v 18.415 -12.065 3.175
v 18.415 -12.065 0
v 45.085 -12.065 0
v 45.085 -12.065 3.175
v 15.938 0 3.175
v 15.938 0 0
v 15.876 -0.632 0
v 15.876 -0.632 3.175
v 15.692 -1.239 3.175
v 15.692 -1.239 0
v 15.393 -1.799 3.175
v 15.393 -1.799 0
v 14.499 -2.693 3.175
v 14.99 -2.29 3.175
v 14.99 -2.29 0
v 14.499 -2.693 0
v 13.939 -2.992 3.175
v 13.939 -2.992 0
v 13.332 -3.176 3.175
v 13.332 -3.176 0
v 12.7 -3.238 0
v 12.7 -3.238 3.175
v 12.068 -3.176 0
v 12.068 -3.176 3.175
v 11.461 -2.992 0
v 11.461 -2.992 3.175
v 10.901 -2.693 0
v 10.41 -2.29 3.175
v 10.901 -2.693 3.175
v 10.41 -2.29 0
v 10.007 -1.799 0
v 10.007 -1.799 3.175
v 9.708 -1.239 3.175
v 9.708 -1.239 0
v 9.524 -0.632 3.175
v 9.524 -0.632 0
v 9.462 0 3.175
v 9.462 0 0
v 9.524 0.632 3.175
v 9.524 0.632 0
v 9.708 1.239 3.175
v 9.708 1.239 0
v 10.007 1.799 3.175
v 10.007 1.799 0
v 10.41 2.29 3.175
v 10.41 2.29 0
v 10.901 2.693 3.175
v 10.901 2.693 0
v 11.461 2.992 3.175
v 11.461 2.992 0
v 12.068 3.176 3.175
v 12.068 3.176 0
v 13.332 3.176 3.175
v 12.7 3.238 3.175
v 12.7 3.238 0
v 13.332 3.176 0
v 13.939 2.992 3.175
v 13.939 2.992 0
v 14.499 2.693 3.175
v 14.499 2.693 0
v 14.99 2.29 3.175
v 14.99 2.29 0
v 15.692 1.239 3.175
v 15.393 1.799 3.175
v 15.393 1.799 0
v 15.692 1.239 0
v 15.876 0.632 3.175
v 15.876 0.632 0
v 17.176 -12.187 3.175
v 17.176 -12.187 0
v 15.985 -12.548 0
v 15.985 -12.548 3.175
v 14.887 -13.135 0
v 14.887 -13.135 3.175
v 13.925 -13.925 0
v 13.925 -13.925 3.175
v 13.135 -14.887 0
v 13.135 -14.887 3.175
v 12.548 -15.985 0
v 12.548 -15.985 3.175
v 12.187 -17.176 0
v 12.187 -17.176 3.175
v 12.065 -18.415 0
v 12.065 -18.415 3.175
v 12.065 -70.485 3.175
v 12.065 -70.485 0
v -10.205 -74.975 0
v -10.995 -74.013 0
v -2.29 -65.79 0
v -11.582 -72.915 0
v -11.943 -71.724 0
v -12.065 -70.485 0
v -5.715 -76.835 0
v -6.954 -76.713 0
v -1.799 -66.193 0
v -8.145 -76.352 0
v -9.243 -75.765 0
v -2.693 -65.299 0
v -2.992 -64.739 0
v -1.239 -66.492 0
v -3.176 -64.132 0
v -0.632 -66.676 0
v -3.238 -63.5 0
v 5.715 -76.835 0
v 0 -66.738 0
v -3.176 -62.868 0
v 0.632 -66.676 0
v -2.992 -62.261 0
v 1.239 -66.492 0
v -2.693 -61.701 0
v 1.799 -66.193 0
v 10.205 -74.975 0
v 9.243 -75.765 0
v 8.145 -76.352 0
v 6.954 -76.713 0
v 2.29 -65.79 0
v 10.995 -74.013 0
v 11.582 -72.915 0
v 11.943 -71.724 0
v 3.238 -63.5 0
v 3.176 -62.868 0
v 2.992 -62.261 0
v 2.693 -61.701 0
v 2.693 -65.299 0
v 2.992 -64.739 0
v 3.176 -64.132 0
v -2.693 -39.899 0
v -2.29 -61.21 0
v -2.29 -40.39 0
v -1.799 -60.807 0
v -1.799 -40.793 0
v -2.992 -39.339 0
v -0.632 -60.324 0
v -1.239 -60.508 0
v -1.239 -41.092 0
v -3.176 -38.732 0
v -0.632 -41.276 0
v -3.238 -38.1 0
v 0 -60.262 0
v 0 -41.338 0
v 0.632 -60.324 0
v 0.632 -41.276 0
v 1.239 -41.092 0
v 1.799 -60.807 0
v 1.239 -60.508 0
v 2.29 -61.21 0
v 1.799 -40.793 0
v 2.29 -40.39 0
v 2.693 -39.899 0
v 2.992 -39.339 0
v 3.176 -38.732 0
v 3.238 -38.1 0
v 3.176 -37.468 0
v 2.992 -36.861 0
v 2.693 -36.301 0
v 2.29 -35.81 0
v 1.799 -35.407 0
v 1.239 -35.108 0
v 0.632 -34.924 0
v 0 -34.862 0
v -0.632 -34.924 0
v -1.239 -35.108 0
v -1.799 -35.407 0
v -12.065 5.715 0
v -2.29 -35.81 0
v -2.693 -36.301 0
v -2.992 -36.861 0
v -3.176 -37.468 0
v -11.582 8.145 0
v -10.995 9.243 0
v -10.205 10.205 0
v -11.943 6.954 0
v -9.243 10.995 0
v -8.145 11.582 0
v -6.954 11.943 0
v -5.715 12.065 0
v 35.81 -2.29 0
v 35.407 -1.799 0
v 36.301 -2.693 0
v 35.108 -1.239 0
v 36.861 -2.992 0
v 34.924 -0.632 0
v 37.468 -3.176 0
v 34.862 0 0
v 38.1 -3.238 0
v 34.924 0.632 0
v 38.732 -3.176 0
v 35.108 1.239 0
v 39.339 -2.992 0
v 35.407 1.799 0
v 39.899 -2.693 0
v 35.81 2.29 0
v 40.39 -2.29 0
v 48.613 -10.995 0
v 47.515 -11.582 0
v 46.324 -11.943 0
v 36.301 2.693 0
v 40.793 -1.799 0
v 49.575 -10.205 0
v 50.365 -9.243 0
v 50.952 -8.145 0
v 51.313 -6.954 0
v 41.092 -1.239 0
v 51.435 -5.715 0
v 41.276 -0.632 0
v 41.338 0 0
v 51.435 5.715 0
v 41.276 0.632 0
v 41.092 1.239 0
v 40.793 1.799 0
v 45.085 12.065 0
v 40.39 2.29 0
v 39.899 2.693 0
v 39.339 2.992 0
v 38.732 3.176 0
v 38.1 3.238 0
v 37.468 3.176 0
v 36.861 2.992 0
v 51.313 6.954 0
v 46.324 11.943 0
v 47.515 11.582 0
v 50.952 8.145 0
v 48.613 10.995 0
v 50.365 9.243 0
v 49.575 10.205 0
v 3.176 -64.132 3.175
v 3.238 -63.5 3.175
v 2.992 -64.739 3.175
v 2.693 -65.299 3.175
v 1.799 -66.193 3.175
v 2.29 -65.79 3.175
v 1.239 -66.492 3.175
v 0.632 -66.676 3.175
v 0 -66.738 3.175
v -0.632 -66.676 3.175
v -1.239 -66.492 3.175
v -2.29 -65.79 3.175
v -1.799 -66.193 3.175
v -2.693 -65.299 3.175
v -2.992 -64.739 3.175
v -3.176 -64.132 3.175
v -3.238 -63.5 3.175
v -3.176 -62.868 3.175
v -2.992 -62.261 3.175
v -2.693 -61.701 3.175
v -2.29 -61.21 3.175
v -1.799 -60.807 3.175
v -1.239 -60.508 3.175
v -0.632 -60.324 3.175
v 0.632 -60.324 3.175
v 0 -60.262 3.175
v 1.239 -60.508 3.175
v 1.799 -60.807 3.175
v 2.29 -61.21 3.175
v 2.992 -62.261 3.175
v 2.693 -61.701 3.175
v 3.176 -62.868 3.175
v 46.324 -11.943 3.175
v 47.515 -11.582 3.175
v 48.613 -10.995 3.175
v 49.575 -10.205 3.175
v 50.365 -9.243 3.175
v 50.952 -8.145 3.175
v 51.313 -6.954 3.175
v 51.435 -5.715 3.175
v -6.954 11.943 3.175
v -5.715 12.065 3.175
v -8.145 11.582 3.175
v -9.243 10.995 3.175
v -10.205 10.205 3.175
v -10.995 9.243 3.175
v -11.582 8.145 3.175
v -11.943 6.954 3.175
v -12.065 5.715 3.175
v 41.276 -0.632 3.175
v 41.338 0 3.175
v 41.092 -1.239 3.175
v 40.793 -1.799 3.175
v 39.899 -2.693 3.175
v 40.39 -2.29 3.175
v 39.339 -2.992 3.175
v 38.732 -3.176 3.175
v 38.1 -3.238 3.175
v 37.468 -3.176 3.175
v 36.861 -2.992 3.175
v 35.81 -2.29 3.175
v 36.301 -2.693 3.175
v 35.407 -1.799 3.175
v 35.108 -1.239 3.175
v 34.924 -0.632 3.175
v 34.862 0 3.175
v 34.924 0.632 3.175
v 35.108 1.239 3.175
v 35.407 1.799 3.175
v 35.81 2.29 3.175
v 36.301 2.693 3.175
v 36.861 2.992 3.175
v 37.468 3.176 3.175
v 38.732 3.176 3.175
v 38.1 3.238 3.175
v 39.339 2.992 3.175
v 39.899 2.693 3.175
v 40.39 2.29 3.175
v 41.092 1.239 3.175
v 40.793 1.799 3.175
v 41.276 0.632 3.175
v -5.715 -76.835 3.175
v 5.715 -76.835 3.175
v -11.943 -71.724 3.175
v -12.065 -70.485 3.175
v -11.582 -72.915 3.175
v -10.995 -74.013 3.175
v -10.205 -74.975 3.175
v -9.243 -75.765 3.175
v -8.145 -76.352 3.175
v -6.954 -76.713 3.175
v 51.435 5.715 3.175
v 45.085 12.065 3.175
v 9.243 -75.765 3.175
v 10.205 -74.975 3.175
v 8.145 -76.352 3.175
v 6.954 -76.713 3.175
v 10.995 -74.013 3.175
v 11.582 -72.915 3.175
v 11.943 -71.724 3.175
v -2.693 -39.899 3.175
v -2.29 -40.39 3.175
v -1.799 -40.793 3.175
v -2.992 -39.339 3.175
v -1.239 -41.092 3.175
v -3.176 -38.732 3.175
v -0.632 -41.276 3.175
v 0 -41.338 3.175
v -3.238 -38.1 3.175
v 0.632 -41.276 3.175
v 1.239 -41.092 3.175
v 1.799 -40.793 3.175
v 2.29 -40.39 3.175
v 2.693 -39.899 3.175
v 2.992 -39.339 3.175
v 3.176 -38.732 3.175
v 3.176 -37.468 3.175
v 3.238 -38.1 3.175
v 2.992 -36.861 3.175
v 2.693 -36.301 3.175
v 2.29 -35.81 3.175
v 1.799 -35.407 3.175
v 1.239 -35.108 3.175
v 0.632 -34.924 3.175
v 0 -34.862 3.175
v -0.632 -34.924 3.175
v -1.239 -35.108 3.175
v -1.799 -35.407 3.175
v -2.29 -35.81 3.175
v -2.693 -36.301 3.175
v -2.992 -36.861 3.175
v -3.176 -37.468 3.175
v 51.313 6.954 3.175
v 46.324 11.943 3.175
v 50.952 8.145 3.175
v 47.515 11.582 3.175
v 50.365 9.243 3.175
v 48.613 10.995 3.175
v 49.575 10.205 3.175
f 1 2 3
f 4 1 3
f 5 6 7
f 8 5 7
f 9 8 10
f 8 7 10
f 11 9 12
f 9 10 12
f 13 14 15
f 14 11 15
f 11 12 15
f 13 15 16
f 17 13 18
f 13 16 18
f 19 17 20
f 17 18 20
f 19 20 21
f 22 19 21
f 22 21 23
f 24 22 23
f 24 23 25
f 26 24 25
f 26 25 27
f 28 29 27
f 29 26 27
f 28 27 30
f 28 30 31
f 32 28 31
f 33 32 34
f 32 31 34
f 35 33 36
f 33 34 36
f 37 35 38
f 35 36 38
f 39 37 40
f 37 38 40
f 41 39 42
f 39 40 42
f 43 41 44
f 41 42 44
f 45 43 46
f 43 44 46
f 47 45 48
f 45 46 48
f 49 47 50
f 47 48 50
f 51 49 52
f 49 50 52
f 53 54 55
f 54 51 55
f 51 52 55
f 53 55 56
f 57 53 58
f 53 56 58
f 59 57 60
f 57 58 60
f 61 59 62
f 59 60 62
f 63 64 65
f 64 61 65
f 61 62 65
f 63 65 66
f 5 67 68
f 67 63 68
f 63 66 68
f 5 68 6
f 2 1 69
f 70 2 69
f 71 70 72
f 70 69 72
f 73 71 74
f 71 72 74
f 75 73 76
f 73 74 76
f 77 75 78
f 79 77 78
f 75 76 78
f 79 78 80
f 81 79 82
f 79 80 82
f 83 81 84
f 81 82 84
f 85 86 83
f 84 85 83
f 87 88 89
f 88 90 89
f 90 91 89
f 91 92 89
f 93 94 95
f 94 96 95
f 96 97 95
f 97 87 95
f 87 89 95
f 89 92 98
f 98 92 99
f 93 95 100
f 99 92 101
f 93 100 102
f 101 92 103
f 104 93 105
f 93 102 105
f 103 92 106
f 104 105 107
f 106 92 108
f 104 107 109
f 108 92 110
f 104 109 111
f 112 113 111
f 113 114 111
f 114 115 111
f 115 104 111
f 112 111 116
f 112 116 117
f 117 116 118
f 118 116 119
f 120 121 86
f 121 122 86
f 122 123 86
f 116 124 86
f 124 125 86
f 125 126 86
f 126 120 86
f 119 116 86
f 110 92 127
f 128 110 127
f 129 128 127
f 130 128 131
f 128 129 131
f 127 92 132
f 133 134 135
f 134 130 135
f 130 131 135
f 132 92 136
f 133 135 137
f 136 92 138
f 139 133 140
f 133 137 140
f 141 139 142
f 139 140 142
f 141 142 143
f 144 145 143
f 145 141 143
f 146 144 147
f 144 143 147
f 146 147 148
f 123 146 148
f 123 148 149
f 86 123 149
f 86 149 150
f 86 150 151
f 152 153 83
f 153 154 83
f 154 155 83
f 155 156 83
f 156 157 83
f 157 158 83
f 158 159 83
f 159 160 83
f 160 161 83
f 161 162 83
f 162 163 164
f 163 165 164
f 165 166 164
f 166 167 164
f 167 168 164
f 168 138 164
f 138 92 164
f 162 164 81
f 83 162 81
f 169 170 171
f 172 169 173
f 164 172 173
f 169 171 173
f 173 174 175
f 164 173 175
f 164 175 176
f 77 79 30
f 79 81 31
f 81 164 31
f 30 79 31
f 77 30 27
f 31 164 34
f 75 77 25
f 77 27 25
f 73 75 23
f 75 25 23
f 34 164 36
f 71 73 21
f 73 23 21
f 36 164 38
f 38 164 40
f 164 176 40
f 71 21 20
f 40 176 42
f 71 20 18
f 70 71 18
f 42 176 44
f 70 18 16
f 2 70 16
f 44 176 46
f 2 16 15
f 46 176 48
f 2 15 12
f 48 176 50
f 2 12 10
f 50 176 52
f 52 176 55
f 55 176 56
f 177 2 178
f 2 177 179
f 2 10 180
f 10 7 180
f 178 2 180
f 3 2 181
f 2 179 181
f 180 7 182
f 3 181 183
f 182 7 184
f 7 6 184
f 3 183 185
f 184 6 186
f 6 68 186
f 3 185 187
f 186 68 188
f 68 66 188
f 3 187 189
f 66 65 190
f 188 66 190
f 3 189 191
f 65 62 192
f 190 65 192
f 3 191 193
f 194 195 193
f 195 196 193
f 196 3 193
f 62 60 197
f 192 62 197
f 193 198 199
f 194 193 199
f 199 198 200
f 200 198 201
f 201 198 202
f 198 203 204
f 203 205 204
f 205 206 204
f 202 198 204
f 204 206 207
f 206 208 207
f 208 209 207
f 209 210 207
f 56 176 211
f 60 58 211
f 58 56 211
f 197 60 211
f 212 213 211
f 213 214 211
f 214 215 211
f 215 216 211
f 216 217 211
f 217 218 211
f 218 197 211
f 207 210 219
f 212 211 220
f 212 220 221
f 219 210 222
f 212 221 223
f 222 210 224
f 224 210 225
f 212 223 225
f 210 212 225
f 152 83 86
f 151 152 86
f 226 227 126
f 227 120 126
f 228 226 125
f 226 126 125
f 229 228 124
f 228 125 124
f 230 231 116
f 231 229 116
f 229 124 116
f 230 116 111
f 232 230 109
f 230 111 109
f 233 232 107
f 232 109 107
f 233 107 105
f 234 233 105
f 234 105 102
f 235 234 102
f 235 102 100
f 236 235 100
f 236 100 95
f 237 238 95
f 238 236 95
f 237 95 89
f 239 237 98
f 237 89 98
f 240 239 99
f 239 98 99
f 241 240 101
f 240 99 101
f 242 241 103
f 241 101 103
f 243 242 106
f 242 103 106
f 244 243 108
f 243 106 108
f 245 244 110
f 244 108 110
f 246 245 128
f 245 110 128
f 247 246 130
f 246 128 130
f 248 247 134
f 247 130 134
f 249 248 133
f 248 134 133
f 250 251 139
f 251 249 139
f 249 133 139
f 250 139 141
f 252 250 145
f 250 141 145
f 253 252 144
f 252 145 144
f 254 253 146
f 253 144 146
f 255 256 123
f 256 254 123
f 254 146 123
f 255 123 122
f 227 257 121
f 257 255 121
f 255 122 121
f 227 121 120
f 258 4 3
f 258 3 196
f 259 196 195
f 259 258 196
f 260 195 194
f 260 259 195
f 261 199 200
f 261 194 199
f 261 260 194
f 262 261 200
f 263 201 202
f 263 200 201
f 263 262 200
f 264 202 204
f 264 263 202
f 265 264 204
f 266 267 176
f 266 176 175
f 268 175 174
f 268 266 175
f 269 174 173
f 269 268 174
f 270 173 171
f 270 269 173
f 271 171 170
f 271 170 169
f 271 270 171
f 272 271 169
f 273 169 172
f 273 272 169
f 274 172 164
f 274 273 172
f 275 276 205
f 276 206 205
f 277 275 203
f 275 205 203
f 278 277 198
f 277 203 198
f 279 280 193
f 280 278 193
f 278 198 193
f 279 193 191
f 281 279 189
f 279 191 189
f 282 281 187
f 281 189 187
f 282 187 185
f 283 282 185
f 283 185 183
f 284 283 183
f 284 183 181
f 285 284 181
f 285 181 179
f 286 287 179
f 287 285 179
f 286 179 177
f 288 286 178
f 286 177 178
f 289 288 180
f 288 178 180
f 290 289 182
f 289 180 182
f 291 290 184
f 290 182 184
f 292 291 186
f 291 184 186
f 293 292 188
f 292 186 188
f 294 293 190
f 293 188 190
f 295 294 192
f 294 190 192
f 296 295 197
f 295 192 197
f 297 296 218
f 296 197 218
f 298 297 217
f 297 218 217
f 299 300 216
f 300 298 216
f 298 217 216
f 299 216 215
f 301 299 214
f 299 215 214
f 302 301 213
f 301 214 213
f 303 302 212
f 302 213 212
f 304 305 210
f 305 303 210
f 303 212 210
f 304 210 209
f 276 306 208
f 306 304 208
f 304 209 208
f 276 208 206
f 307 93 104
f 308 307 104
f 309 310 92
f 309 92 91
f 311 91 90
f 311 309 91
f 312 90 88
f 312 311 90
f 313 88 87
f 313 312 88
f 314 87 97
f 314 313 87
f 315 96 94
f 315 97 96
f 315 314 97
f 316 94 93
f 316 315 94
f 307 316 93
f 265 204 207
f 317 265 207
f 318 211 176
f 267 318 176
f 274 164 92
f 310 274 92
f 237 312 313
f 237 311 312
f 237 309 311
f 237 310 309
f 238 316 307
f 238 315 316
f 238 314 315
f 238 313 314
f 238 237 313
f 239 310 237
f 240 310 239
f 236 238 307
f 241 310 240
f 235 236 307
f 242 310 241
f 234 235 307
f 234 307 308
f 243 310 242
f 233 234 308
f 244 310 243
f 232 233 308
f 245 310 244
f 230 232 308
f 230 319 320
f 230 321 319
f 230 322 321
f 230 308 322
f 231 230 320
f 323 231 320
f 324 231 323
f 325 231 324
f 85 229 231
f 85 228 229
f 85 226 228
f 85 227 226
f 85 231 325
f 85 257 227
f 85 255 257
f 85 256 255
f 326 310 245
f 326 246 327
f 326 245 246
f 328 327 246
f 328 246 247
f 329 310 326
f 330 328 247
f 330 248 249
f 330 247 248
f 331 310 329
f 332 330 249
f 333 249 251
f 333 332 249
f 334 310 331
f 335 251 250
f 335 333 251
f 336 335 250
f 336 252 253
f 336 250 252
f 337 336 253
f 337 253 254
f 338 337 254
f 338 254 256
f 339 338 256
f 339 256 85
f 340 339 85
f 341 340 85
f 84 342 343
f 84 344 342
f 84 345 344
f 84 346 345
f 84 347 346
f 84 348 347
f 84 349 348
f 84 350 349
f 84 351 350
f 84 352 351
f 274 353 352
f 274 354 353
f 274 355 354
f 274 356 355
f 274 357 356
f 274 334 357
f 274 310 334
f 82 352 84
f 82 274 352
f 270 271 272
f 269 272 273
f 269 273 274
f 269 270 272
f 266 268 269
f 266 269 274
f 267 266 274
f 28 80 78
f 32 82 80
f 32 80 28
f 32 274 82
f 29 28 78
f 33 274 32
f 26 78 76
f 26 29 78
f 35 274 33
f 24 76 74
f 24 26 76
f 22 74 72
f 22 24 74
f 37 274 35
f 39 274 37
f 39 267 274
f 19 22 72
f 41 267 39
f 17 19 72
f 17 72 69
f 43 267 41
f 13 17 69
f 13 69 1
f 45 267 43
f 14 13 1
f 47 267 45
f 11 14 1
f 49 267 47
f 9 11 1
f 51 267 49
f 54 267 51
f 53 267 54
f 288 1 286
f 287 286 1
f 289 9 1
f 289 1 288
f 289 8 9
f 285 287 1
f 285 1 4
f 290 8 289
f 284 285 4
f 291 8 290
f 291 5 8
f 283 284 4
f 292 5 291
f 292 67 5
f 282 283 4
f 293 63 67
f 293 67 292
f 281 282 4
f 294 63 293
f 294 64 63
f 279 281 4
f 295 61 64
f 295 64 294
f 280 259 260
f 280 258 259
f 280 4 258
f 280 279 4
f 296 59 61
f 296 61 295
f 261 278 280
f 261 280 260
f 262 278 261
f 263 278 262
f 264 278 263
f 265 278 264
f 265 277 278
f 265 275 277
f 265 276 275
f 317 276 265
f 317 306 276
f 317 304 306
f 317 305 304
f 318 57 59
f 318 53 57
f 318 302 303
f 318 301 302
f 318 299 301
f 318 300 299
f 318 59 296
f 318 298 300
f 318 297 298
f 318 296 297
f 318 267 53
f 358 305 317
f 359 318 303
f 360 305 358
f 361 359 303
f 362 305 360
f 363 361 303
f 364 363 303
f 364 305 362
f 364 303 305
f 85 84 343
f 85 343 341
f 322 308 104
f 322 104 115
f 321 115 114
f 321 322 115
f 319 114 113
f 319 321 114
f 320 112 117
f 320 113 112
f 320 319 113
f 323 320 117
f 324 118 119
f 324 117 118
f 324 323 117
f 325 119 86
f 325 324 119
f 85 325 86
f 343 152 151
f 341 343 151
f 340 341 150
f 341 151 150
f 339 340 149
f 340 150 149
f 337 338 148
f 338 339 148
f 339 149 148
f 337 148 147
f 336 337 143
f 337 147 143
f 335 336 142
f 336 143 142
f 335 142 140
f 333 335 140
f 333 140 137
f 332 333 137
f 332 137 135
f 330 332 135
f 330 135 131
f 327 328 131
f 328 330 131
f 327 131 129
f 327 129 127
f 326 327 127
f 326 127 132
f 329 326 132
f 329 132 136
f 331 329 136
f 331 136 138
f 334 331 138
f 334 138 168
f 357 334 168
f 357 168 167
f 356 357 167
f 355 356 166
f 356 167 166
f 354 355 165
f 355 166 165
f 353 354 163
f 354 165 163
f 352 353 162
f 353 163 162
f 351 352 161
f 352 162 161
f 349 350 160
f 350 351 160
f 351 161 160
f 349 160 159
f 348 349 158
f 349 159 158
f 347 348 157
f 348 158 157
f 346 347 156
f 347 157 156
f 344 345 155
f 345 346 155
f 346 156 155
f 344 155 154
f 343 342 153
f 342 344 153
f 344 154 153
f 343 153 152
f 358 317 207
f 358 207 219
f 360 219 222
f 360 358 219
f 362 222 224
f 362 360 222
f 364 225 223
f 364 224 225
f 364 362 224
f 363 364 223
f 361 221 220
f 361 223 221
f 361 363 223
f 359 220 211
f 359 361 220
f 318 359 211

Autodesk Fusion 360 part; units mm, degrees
sketch "Sketch1" plane through (0, 0, 0) normal (0, 0, 1) x (1, 0, 0)
  circle A0 centre (0, -38.1) radius 3.2385
  circle A1 centre (0, -63.5) radius 3.2385
  circle A2 centre (12.7, 0) radius 3.2385
  circle A3 centre (38.1, 0) radius 3.2385
  line L0 (-12.065, 12.065) -> (-12.065, -76.835)
  line L1 (-12.065, -76.835) -> (12.065, -76.835)
  line L2 (12.065, -76.835) -> (12.065, -12.065)
  line L3 (12.065, -12.065) -> (51.435, -12.065)
  line L4 (51.435, -12.065) -> (51.435, 12.065)
  line L5 (51.435, 12.065) -> (-12.065, 12.065)
  line L6 (0, 0) -> (51.435, 0) construction
  line L7 (0, 0) -> (0, -76.835) construction
  dimension "d1" = 6.477
  dimension "d2" = 38.1
  dimension "d4" = 25.4
  dimension "d6" = 12.7
  dimension "d8" = 24.13
  dimension "d9" = 24.13
  dimension "d10" = 88.9
  dimension "d11" = 25.4
  dimension "d12" = 63.5
extrude "Extrude1" add sketch "Sketch1" along normal blind 3.175
fillet "Fillet1" radius 6.35 6 edges at (12.065, -76.835, 1.5875) (-12.065, -76.835, 1.5875) (-12.065, 12.065, 1.5875) (51.435, -12.065, 1.5875) (51.435, 12.065, 1.5875) (12.065, -12.065, 1.5875)
equation "d13 = ( 1 / 8 ) * 1 in"
